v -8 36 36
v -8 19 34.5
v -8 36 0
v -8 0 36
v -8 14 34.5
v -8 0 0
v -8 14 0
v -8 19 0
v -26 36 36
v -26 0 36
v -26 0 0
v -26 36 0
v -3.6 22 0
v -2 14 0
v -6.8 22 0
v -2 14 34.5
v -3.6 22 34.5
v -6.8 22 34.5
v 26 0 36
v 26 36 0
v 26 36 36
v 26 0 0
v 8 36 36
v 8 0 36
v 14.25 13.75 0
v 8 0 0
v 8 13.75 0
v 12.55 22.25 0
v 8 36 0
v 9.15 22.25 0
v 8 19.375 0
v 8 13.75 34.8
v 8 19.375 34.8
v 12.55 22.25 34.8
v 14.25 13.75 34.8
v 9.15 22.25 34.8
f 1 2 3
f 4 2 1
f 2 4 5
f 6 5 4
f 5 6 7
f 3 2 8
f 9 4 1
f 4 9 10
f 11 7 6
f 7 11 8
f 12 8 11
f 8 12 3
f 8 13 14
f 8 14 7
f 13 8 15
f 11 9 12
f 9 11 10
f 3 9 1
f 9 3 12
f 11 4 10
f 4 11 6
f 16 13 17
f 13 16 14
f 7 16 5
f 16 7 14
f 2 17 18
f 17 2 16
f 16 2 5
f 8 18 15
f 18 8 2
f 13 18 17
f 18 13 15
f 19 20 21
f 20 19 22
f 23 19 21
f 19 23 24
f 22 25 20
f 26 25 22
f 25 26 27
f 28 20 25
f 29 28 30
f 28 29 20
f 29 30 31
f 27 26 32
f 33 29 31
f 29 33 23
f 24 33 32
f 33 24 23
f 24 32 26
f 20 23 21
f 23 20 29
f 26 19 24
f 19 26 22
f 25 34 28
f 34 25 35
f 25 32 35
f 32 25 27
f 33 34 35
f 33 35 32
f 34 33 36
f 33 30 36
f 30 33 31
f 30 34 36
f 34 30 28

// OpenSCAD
// file: ../components/vendor/jointscad/DovetailJoint.scad
function getDovetailCorners(dimensions) = [
    [0, 0],
    [getDovetailLargeWidth(dimensions[0]), 0],
    [dimensions[0], dimensions[1]],
    [dimensions[0]/2, dimensions[1]]
];
function getDovetailTranslations(numberOfDovetails, largeWidth) = [
    for(i = [0: numberOfDovetails-1])
        [getXSpacing(largeWidth, i), 0, 0]
];
function getDovetailLargeWidth(width) = width * 1.25;
function getDovetailBaseWidth(width) = width * 0.8;
function getXSpacing(largeWidth, index) = largeWidth/2 + (index * largeWidth * 2);

module dovetail(dimensions) {
    corners = getDovetailCorners(dimensions);

    linear_extrude(height = dimensions[2]) {
        polygon(corners);
    }
}

module dovetailJointA(dimensions, numberOfDovetails) {
    width = dimensions[0];
    length = dimensions[1];
    height = dimensions[2];

    dovetailLargeWidth = width/(numberOfDovetails*2);
    dovetailBaseWidth = getDovetailBaseWidth(dovetailLargeWidth);

    for(t=getDovetailTranslations(numberOfDovetails, dovetailLargeWidth)) {
        translate(t) {
            dovetail([dovetailBaseWidth, length, height]);
        }
    }
}

module dovetailJointB(dimensions, numberOfDovetails) {
    difference() {
        cube(dimensions);
        dovetailJointA(dimensions, numberOfDovetails);
    }
}
// main file
use <../components/vendor/jointscad/DovetailJoint.scad>

$fn = 32;
part_id = 0; // 0 plate, 1 India, 2 Austria, 3 assembled, 4 exploded, 5 collision, 10-15 color volumes

cube_size = 36;
half_width = cube_size / 2;
band_height = cube_size / 3;

dovetail_dimensions = [16, 8, 34.5];
dovetail_clearance = 0.25;
dovetail_embed = 2;
dovetail_x = -dovetail_dimensions[0] / 4 - dovetail_embed;
dovetail_top_gap = cube_size - dovetail_dimensions[2];
receiver_top = cube_size - dovetail_top_gap + dovetail_clearance;
eps = 0.05;

india_saffron = "#FF8C1A";
india_green = "#138808";
austria_red = "#C8102E";

module dovetail_key() {
    translate([dovetail_x, cube_size / 2 - dovetail_dimensions[1] / 2, 0])
        dovetailJointA(dovetail_dimensions, 1);
}

module dovetail_receiver_cut() {
    profile_width = dovetail_dimensions[0] / 2;
    scale_x = (profile_width + 2 * dovetail_clearance) / profile_width;
    scale_y = (dovetail_dimensions[1] + 2 * dovetail_clearance) / dovetail_dimensions[1];
    center_x = dovetail_dimensions[0] / 2;
    center_y = dovetail_dimensions[1] / 2;

    translate([dovetail_x, cube_size / 2 - dovetail_dimensions[1] / 2, 0])
        translate([center_x, center_y, -eps])
            scale([scale_x, scale_y, 1])
                translate([-center_x, -center_y, 0])
                    dovetailJointA([
                        dovetail_dimensions[0],
                        dovetail_dimensions[1],
                        receiver_top + 2 * eps
                    ], 1);
}

module india_core() {
    union() {
        translate([-half_width, 0, 0]) cube([half_width, cube_size, cube_size]);
        dovetail_key();
    }
}

module austria_core() {
    difference() {
        cube([half_width, cube_size, cube_size]);
        dovetail_receiver_cut();
    }
}

module india_band(index) {
    intersection() {
        india_core();
        translate([-half_width - 1, -1, index * band_height])
            cube([half_width + 7, cube_size + 2, band_height]);
    }
}

module austria_band(index) {
    intersection() {
        austria_core();
        translate([-1, -1, index * band_height])
            cube([half_width + 2, cube_size + 2, band_height]);
    }
}

module india_colored() {
    color(india_green) render(convexity=10) india_band(0);
    color("white") render(convexity=10) india_band(1);
    color(india_saffron) render(convexity=10) india_band(2);
}

module austria_colored() {
    color(austria_red) render(convexity=10) austria_band(0);
    color("white") render(convexity=10) austria_band(1);
    color(austria_red) render(convexity=10) austria_band(2);
}

module print_layout() {
    translate([-8, 0, 0]) india_colored();
    translate([8, 0, 0]) austria_colored();
}

module assembly() {
    india_colored();
    austria_colored();
}

module exploded() {
    translate([-7, 0, 0]) india_colored();
    translate([7, 0, 0]) austria_colored();
}

if (part_id == 1) {
    india_core();
} else if (part_id == 2) {
    austria_core();
} else if (part_id == 3) {
    assembly();
} else if (part_id == 4) {
    exploded();
} else if (part_id == 5) {
    intersection() {
        india_core();
        austria_core();
    }
} else if (part_id >= 10 && part_id <= 12) {
    translate([-8, 0, 0]) india_band(part_id - 10);
} else if (part_id >= 13 && part_id <= 15) {
    translate([8, 0, 0]) austria_band(part_id - 13);
} else {
    print_layout();
}
